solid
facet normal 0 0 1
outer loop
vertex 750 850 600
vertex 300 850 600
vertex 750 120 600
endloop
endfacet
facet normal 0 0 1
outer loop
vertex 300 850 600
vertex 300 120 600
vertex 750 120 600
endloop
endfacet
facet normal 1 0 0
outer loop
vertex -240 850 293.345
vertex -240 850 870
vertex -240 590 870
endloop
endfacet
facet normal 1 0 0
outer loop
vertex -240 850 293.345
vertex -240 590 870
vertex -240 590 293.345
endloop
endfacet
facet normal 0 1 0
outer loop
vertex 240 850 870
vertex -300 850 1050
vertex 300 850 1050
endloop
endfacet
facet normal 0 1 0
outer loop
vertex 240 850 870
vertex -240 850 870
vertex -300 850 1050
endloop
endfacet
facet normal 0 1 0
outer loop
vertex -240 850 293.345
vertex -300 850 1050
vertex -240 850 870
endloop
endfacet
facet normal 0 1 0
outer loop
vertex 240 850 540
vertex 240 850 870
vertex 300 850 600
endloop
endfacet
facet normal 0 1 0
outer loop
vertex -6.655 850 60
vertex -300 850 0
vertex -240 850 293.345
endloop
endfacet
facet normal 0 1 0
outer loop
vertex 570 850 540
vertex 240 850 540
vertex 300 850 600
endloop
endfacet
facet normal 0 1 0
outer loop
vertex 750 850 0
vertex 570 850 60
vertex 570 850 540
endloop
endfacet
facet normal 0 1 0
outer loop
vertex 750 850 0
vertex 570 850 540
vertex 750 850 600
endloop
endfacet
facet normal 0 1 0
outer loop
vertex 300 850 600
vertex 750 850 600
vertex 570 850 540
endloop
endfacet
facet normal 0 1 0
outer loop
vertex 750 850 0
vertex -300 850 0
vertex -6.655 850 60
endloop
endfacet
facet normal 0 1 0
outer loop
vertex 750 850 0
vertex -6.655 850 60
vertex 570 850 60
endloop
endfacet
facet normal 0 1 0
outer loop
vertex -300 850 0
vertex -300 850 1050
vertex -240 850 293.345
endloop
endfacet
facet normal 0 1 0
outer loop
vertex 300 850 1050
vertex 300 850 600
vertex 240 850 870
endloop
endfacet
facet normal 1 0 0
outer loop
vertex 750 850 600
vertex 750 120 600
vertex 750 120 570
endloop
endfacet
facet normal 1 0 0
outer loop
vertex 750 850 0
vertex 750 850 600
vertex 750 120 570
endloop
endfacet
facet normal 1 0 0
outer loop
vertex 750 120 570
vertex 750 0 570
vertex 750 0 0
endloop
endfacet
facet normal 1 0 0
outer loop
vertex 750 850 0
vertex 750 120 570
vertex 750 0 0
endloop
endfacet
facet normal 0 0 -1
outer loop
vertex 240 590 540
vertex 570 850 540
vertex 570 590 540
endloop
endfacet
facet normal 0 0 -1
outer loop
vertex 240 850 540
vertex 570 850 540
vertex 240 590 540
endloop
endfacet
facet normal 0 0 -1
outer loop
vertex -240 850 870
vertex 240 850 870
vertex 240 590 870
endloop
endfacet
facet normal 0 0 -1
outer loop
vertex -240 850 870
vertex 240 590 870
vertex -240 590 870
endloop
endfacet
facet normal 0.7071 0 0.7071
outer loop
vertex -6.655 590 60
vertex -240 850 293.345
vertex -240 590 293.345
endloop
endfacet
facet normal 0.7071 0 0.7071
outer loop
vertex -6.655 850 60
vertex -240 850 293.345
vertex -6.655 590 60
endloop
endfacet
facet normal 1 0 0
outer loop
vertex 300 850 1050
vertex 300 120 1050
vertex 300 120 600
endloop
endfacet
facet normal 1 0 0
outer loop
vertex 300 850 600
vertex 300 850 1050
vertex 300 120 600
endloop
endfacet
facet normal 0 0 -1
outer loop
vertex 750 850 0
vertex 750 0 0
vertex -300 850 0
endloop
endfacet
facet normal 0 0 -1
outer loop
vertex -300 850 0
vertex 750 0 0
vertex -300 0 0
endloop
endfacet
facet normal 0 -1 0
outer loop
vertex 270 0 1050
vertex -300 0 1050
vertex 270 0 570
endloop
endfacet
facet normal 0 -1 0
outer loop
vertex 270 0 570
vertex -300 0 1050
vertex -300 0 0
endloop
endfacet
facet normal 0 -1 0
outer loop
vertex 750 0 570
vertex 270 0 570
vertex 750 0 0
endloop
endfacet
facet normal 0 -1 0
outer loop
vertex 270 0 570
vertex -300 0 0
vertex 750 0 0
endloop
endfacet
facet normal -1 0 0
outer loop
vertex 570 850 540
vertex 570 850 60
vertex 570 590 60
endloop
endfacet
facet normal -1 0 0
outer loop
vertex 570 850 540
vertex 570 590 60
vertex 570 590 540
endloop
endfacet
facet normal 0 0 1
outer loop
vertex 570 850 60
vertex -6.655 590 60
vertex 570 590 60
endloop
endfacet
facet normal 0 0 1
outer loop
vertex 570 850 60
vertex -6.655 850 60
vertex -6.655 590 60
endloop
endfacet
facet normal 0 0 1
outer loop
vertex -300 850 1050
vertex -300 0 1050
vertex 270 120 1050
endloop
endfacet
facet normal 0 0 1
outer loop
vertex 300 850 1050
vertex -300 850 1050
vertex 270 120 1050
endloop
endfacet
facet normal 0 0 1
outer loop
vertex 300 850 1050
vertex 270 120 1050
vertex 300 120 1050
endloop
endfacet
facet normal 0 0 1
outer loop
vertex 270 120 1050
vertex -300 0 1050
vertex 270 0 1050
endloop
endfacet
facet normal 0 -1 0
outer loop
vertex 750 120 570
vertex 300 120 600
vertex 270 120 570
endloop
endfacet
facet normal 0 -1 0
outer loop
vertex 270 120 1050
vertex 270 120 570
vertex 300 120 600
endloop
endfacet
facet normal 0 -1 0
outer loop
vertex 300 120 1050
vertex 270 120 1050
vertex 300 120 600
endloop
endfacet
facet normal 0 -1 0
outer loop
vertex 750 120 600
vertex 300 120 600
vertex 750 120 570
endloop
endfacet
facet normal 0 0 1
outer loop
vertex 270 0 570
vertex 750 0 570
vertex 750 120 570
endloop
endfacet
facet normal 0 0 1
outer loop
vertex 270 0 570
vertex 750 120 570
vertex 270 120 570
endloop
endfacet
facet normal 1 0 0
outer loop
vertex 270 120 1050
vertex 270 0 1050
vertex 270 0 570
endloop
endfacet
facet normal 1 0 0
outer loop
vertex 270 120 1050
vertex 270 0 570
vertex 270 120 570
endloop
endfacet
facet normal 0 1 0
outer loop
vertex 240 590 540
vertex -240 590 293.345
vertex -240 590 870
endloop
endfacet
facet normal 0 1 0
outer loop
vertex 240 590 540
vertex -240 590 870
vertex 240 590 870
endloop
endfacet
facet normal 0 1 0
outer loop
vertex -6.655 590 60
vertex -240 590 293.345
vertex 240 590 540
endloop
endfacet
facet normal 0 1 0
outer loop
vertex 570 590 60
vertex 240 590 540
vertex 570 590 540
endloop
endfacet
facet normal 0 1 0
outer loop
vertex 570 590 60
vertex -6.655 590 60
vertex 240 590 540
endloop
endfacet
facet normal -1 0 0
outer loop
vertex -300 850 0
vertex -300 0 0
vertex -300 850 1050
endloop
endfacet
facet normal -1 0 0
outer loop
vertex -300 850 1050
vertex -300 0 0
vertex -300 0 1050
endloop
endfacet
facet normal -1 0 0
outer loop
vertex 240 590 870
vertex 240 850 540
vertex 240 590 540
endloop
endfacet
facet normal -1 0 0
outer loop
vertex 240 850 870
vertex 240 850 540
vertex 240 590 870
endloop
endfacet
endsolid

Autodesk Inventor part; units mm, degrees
ref_plane "YZ Plane" through (0, 0, 0) normal (1, 0, 0) x (0, 1, 0)
ref_plane "XZ Plane" through (0, 0, 0) normal (0, 1, 0) x (-1, 0, 0)
ref_plane "XY Plane" through (0, 0, 0) normal (0, 0, 1) x (1, 0, 0)
sketch "Sketch1" plane through (0, 0, 0) normal (0, 1, 0) x (1, 0, 0)
  line L0 (300, 0) -> (-300, 0)
  line L1 (-300, 0) -> (-300, -600)
  line L2 (-300, -600) -> (300, -600)
  line L3 (300, -600) -> (300, 0)
  point P0 (0, 0)
  point P1 (0, 0)
  dimension "d0" = 600
  dimension "d1" = 600
extrude "Extrusion1" add sketch "Sketch1" along normal blind 850
sketch "Sketch2" plane through (-300, 0, 600) normal (0, 0, 1) x (-1, 0, 0)
  line L0 (-600, 0) -> (-600, -850) projected
  line L1 (-600, 0) -> (-570, 0)
  line L2 (-570, 0) -> (-570, -120)
  line L3 (-570, -120) -> (-600, -120)
  line L4 (-600, -120) -> (-600, 0)
  point P0 (-300, 0)
  dimension "d4" = 120
  dimension "d7" = 30
extrude "Extrusion2" cut sketch "Sketch2" against normal blind 30
move faces "Move3" translate (450, 0, 0) faces at (300, 323.3333, 190)
move faces "Move4" translate (0, 0, 450) faces at (240, 606.6667, 600)
sketch "Sketch3" plane through (270, 120, 570) normal (0, -1, 0) x (1, 0, 0)
  line L0 (-570, 480) -> (480, 480) projected
  line L1 (480, 480) -> (30, 480)
  line L2 (30, 480) -> (30, 30)
  line L3 (30, 30) -> (480, 30)
  line L4 (480, 30) -> (480, 480)
  line L5 (-570, 480) -> (-570, -570) projected
  line L6 (-570, -570) -> (480, -570) projected
  point P0 (-270, -570)
  point P1 (30, 480)
  dimension "d20" = 600
  dimension "d21" = 600
extrude "Extrusion3" cut sketch "Sketch3" against normal through all
sketch "Sketch4" plane through (0, 850, 0) normal (0, 1, 0) x (1, 0, 0)
  line L0 (-240, -293.3452) -> (-6.6548, -60)
  line L1 (-6.6548, -60) -> (570, -60)
  line L2 (570, -60) -> (570, -540)
  line L3 (570, -540) -> (240, -540)
  line L4 (240, -540) -> (240, -870)
  line L5 (240, -870) -> (-240, -870)
  line L6 (-240, -870) -> (-240, -293.3452)
  line L7 (300, -600) -> (300, -1050) construction
  line L8 (240, -540) -> (300, -600) construction
  line L9 (-300, 0) -> (-300, -1050) projected
  point P0 (0, 0)
  point P1 (0, -870)
  dimension "d24" = 480
  dimension "d25" = 330
  dimension "d26" = 810
  dimension "d27" = 576.6548
  dimension "d28" = 330
  dimension "d29" = 300
extrude "Extrusion4" cut sketch "Sketch4" against normal blind 260
equation "\"d19\" = d16"
equation "\"d16\" = 450"
properties part number "Mobile lavandino angolo"
